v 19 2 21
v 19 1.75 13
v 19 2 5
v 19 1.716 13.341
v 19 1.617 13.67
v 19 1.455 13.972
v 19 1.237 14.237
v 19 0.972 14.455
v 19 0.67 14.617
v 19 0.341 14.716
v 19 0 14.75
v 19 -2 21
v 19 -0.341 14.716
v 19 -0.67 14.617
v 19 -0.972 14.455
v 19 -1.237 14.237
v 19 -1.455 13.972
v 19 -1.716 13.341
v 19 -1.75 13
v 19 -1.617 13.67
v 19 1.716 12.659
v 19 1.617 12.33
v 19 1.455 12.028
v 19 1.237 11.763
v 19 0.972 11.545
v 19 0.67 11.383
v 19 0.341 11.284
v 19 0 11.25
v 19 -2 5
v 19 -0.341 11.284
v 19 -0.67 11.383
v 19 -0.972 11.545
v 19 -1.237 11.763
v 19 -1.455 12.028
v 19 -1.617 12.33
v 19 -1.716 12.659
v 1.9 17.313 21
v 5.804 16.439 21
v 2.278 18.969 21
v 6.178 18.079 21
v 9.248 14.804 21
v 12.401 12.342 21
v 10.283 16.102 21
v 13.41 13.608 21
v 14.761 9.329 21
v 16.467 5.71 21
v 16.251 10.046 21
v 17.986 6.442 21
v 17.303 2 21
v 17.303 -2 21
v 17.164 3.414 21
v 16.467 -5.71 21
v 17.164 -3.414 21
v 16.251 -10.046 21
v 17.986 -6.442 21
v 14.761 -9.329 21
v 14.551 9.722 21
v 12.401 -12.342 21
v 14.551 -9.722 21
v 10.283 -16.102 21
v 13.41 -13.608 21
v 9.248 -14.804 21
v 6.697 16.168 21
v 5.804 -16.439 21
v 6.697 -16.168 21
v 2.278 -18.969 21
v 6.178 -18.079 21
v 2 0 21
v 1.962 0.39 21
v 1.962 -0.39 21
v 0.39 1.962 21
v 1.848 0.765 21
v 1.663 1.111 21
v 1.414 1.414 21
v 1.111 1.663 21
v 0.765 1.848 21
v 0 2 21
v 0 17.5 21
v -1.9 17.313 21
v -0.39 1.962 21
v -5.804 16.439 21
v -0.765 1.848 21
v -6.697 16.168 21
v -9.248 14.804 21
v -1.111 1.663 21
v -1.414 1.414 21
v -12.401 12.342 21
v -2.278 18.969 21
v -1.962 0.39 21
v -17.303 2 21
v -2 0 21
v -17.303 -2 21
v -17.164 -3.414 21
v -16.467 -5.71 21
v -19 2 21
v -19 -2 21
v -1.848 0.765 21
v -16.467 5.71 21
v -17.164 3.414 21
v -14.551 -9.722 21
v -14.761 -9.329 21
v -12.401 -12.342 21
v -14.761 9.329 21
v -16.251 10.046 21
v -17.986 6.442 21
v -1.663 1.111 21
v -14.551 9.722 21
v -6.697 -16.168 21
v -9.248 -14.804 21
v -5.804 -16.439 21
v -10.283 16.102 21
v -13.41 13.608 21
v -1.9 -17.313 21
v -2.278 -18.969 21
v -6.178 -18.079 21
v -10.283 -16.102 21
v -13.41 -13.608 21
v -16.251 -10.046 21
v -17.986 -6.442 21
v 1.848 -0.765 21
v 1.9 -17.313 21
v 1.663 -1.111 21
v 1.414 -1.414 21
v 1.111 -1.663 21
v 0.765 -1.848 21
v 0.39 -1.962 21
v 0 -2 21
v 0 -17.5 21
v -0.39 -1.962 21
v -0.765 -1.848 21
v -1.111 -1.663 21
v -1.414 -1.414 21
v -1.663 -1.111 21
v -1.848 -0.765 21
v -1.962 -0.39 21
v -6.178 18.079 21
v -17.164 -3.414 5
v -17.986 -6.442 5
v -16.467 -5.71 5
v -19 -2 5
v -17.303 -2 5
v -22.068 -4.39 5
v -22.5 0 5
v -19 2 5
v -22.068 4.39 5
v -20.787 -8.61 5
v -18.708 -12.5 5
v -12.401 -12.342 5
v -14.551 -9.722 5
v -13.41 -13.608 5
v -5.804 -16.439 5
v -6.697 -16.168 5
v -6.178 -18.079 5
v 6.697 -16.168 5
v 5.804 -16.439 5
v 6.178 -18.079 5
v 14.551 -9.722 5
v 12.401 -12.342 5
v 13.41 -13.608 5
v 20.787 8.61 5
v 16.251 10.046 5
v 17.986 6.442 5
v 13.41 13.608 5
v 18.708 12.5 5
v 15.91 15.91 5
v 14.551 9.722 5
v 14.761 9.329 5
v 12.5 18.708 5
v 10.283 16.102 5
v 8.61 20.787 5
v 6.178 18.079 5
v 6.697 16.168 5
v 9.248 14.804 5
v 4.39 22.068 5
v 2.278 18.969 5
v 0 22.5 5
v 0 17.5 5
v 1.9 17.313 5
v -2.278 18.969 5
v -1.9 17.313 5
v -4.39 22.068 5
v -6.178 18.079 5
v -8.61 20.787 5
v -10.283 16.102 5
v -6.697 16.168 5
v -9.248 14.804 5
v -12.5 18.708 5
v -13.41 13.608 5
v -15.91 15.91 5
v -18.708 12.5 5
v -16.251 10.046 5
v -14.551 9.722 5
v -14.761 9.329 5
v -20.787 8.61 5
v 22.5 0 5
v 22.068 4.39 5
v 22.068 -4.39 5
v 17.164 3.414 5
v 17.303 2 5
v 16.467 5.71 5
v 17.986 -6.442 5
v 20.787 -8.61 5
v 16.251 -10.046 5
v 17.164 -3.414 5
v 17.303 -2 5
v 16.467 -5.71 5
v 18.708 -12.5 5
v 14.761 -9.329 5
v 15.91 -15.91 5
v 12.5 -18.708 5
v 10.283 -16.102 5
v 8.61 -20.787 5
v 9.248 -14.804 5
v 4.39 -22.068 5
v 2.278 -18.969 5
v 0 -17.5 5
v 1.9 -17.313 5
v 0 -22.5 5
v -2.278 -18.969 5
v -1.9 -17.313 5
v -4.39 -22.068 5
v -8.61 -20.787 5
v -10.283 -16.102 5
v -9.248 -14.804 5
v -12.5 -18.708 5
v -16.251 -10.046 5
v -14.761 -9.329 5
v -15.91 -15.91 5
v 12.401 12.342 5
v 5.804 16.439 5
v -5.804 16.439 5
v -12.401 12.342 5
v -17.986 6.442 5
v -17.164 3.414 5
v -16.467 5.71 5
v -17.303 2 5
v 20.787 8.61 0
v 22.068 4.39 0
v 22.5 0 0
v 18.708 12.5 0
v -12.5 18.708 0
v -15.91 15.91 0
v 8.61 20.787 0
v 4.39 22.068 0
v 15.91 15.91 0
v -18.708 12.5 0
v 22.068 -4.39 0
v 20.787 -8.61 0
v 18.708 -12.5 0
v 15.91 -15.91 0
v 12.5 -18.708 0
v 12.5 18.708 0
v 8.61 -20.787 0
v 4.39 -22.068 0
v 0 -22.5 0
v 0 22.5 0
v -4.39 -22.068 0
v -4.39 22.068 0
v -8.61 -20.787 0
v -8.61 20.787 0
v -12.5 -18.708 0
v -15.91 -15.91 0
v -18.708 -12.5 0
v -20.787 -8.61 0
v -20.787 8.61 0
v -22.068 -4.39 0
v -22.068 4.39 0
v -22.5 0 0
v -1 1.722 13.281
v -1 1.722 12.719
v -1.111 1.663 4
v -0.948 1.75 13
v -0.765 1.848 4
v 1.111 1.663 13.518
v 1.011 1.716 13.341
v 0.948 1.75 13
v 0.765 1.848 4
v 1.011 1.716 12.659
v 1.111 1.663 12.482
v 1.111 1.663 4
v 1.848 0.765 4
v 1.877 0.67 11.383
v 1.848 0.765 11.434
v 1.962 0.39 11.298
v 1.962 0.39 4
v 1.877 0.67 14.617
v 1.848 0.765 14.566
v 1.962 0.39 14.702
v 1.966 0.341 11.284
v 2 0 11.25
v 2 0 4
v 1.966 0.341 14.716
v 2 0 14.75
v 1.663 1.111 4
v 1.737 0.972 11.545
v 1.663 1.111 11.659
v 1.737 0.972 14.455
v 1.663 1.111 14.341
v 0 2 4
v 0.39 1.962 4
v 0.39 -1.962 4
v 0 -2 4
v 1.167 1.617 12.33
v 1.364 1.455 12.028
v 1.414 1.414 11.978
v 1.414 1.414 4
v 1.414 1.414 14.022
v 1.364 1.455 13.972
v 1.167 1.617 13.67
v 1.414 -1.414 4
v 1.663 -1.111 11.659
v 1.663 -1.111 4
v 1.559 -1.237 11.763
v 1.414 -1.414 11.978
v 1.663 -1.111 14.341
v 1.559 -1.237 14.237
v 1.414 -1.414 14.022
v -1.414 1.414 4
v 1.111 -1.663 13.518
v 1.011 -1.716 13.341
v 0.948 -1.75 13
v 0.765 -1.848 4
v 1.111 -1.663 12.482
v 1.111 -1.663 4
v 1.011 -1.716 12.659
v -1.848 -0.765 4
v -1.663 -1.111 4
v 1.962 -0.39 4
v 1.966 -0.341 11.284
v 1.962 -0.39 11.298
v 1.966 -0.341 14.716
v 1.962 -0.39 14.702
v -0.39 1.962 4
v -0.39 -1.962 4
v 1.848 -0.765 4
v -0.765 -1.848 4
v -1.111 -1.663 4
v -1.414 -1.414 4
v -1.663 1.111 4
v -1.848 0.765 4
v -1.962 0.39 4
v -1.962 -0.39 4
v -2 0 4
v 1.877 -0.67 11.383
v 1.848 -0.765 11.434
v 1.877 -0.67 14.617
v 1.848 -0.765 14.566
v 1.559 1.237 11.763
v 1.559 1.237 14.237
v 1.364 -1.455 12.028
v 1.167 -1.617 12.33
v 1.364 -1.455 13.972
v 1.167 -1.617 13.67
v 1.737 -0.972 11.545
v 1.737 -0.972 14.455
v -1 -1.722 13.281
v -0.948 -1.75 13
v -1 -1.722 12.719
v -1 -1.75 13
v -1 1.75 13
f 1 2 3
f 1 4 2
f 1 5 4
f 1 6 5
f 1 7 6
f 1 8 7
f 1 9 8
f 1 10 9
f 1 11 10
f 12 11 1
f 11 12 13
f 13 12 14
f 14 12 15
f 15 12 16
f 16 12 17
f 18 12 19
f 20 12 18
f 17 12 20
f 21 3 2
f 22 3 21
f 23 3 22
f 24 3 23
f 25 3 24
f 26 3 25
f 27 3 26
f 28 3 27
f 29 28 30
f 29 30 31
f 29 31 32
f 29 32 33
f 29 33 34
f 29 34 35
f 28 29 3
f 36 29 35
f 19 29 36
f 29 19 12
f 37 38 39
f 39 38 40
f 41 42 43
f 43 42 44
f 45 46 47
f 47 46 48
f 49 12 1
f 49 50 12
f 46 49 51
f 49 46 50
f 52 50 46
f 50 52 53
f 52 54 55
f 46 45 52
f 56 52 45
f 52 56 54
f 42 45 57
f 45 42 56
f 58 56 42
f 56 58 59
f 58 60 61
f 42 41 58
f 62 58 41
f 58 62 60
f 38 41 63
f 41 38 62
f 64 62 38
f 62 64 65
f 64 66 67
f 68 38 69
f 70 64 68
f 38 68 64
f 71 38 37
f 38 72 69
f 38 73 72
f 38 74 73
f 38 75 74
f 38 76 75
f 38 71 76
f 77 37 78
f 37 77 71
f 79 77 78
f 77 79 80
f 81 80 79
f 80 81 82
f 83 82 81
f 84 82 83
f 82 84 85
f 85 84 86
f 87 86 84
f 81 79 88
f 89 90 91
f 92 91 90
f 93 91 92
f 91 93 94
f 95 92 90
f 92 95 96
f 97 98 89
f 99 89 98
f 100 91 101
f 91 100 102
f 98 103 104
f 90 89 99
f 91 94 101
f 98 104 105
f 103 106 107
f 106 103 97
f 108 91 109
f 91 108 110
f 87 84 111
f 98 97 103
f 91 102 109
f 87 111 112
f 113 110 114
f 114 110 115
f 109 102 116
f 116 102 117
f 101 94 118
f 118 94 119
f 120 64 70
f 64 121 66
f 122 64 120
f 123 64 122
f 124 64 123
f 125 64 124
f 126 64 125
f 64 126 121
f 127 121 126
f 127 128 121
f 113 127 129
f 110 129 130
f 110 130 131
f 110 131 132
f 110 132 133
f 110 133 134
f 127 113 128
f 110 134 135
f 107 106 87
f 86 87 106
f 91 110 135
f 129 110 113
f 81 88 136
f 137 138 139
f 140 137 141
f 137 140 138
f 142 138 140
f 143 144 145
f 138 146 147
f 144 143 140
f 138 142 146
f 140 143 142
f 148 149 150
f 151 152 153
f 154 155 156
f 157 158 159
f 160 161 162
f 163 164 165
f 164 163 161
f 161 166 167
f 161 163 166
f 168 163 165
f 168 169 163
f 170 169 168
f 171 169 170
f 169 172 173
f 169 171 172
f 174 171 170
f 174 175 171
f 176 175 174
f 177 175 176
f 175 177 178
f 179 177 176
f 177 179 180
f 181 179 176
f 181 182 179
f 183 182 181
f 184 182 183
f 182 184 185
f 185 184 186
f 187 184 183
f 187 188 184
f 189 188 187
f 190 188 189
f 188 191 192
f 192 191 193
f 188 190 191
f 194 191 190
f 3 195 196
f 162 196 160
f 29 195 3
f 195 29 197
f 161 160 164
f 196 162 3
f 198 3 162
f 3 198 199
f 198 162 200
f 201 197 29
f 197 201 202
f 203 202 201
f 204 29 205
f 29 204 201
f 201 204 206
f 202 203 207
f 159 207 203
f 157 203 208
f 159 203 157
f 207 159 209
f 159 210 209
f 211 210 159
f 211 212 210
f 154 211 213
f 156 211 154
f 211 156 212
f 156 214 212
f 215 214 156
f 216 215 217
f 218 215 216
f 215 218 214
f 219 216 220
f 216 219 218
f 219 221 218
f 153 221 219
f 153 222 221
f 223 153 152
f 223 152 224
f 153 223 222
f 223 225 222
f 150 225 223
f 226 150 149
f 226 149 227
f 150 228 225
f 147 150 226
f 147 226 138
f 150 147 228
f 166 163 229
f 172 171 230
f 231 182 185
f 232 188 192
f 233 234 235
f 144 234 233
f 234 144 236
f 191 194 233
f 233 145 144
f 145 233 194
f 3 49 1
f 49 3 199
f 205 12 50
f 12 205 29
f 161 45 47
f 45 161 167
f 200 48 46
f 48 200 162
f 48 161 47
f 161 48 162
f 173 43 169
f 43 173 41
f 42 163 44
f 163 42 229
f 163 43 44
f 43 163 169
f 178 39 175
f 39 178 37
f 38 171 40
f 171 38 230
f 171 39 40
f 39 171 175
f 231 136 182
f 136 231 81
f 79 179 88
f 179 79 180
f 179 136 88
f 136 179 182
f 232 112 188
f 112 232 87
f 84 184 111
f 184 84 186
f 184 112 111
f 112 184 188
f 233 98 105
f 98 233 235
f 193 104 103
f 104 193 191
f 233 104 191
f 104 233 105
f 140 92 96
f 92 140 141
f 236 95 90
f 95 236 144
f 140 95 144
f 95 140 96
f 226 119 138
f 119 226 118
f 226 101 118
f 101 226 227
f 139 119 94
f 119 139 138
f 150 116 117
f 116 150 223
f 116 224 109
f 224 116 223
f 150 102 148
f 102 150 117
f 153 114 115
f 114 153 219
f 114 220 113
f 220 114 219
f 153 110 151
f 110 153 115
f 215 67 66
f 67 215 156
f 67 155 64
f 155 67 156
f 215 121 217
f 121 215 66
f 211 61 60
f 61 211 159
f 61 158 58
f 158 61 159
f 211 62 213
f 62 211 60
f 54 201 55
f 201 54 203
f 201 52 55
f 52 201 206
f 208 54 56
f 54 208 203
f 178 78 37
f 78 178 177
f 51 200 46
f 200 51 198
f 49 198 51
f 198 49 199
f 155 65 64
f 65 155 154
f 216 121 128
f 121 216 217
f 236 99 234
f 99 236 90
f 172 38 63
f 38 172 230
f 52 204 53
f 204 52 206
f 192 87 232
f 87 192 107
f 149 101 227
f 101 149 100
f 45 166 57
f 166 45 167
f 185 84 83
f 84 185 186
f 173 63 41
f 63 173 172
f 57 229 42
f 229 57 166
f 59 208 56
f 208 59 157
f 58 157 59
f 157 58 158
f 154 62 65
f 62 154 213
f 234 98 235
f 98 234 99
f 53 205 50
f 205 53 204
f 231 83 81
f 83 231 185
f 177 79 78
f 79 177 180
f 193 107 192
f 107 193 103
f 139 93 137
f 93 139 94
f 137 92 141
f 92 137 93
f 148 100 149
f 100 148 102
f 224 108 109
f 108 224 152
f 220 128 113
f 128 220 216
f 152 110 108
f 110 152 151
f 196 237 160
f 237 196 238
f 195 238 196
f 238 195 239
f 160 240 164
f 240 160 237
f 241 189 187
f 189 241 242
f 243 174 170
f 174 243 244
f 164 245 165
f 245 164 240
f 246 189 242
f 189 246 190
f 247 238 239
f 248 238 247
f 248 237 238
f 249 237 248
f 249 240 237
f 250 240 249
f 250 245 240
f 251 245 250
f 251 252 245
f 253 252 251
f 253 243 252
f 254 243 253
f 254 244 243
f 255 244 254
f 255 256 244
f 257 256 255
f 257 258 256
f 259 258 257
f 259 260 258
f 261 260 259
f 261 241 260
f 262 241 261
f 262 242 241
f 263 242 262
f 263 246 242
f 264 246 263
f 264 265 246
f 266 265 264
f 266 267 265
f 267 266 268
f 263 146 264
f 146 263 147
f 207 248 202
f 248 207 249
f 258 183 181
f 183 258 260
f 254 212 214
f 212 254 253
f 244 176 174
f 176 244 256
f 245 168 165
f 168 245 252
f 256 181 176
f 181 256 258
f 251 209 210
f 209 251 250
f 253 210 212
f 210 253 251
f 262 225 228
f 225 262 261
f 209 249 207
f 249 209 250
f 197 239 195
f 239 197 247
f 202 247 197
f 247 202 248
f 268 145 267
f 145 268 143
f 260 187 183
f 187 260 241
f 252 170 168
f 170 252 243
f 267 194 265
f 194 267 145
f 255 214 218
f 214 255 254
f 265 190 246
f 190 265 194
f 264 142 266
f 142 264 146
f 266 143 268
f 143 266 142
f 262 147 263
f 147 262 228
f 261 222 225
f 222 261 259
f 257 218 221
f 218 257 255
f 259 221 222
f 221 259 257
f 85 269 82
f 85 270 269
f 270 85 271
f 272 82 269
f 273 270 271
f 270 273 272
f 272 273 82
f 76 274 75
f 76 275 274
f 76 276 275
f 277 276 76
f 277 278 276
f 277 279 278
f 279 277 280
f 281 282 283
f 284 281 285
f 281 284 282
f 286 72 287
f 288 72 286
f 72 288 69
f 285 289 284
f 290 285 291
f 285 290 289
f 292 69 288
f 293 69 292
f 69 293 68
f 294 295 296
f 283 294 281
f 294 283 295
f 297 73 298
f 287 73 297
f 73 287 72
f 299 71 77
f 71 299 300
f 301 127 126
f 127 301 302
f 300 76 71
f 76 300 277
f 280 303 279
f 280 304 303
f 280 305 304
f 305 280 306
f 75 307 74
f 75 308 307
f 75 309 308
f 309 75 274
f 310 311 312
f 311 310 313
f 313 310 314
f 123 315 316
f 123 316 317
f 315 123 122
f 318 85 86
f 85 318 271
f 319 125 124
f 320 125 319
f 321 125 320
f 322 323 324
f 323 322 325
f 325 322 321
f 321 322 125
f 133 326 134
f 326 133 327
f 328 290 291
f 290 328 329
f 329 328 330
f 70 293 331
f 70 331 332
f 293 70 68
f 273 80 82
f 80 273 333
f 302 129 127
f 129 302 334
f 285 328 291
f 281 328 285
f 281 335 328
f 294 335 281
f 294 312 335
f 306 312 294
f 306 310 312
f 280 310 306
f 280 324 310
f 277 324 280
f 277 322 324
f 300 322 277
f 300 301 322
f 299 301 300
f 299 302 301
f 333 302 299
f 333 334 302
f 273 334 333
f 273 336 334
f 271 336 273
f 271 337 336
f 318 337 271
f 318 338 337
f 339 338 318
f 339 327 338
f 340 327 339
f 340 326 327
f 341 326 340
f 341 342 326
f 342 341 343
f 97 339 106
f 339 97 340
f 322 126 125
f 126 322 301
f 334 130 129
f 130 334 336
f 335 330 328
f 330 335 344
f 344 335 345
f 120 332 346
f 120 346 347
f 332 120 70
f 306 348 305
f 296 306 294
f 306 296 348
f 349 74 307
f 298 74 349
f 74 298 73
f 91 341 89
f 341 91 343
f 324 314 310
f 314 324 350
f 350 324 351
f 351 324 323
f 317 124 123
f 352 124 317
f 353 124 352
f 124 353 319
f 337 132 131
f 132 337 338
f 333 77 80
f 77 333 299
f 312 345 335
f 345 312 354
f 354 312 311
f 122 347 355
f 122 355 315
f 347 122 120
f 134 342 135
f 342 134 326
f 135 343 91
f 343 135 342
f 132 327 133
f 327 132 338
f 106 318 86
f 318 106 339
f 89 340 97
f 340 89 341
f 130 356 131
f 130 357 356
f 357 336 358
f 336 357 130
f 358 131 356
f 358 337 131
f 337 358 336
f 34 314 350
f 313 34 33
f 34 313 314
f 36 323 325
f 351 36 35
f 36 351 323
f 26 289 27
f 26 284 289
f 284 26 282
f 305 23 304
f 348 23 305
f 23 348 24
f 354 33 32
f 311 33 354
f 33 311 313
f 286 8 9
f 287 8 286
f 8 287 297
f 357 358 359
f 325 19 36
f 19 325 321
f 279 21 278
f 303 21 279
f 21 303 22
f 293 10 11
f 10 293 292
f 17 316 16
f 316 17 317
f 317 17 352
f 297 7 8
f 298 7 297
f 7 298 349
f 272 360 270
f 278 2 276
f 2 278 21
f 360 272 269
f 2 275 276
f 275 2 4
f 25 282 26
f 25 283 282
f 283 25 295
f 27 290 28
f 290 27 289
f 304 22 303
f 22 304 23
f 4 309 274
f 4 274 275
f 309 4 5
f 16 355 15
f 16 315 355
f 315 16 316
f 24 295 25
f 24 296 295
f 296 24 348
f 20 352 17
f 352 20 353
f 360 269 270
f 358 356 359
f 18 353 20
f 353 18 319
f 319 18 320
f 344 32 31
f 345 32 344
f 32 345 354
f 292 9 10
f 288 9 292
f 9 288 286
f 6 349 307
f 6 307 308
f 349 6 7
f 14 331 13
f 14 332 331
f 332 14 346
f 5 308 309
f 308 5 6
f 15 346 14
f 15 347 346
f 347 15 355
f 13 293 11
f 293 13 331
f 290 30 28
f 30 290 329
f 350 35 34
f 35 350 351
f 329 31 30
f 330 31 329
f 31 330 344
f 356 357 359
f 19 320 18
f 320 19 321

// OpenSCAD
$fn = 32;

// ----------------------------------------------------------------------
// Control knob: skirt knob with grip ribs
// ----------------------------------------------------------------------

// --- parameters (mm) ---
skirt_d = 45;             // skirt diameter
skirt_t = 5;              // skirt thickness
rib_w = 4;                // grip rib width
rib_out = 2.5;            // grip rib radial protrusion
n_ribs = 14;              // number of grip ribs
knob_d = 35;              // knob body diameter
knob_h = 16;              // knob body height
bore_d = 4;               // shaft bore diameter
set_d = 3.5;              // set screw bore diameter

rib_step = 360 / n_ribs;  // rib angular step
total_h = skirt_t + knob_h;  // overall height

difference() {
  union() {
    translate([0, 0, skirt_t]) cylinder(h = knob_h, d = knob_d);
    cylinder(h = skirt_t, d = skirt_d);
    for (i = [0 : n_ribs - 1])
      rotate([0, 0, i * rib_step])
        translate([knob_d / 2 - 1, -rib_w / 2, skirt_t])
          cube([rib_out, rib_w, knob_h]);
  }
  translate([0, 0, skirt_t - 1]) cylinder(h = knob_h + 2, d = bore_d);
  translate([-1, 0, skirt_t + knob_h / 2]) rotate([0, 90, 0])
    cylinder(h = knob_d / 2 + bore_d / 2 + 2, d = set_d);
}
